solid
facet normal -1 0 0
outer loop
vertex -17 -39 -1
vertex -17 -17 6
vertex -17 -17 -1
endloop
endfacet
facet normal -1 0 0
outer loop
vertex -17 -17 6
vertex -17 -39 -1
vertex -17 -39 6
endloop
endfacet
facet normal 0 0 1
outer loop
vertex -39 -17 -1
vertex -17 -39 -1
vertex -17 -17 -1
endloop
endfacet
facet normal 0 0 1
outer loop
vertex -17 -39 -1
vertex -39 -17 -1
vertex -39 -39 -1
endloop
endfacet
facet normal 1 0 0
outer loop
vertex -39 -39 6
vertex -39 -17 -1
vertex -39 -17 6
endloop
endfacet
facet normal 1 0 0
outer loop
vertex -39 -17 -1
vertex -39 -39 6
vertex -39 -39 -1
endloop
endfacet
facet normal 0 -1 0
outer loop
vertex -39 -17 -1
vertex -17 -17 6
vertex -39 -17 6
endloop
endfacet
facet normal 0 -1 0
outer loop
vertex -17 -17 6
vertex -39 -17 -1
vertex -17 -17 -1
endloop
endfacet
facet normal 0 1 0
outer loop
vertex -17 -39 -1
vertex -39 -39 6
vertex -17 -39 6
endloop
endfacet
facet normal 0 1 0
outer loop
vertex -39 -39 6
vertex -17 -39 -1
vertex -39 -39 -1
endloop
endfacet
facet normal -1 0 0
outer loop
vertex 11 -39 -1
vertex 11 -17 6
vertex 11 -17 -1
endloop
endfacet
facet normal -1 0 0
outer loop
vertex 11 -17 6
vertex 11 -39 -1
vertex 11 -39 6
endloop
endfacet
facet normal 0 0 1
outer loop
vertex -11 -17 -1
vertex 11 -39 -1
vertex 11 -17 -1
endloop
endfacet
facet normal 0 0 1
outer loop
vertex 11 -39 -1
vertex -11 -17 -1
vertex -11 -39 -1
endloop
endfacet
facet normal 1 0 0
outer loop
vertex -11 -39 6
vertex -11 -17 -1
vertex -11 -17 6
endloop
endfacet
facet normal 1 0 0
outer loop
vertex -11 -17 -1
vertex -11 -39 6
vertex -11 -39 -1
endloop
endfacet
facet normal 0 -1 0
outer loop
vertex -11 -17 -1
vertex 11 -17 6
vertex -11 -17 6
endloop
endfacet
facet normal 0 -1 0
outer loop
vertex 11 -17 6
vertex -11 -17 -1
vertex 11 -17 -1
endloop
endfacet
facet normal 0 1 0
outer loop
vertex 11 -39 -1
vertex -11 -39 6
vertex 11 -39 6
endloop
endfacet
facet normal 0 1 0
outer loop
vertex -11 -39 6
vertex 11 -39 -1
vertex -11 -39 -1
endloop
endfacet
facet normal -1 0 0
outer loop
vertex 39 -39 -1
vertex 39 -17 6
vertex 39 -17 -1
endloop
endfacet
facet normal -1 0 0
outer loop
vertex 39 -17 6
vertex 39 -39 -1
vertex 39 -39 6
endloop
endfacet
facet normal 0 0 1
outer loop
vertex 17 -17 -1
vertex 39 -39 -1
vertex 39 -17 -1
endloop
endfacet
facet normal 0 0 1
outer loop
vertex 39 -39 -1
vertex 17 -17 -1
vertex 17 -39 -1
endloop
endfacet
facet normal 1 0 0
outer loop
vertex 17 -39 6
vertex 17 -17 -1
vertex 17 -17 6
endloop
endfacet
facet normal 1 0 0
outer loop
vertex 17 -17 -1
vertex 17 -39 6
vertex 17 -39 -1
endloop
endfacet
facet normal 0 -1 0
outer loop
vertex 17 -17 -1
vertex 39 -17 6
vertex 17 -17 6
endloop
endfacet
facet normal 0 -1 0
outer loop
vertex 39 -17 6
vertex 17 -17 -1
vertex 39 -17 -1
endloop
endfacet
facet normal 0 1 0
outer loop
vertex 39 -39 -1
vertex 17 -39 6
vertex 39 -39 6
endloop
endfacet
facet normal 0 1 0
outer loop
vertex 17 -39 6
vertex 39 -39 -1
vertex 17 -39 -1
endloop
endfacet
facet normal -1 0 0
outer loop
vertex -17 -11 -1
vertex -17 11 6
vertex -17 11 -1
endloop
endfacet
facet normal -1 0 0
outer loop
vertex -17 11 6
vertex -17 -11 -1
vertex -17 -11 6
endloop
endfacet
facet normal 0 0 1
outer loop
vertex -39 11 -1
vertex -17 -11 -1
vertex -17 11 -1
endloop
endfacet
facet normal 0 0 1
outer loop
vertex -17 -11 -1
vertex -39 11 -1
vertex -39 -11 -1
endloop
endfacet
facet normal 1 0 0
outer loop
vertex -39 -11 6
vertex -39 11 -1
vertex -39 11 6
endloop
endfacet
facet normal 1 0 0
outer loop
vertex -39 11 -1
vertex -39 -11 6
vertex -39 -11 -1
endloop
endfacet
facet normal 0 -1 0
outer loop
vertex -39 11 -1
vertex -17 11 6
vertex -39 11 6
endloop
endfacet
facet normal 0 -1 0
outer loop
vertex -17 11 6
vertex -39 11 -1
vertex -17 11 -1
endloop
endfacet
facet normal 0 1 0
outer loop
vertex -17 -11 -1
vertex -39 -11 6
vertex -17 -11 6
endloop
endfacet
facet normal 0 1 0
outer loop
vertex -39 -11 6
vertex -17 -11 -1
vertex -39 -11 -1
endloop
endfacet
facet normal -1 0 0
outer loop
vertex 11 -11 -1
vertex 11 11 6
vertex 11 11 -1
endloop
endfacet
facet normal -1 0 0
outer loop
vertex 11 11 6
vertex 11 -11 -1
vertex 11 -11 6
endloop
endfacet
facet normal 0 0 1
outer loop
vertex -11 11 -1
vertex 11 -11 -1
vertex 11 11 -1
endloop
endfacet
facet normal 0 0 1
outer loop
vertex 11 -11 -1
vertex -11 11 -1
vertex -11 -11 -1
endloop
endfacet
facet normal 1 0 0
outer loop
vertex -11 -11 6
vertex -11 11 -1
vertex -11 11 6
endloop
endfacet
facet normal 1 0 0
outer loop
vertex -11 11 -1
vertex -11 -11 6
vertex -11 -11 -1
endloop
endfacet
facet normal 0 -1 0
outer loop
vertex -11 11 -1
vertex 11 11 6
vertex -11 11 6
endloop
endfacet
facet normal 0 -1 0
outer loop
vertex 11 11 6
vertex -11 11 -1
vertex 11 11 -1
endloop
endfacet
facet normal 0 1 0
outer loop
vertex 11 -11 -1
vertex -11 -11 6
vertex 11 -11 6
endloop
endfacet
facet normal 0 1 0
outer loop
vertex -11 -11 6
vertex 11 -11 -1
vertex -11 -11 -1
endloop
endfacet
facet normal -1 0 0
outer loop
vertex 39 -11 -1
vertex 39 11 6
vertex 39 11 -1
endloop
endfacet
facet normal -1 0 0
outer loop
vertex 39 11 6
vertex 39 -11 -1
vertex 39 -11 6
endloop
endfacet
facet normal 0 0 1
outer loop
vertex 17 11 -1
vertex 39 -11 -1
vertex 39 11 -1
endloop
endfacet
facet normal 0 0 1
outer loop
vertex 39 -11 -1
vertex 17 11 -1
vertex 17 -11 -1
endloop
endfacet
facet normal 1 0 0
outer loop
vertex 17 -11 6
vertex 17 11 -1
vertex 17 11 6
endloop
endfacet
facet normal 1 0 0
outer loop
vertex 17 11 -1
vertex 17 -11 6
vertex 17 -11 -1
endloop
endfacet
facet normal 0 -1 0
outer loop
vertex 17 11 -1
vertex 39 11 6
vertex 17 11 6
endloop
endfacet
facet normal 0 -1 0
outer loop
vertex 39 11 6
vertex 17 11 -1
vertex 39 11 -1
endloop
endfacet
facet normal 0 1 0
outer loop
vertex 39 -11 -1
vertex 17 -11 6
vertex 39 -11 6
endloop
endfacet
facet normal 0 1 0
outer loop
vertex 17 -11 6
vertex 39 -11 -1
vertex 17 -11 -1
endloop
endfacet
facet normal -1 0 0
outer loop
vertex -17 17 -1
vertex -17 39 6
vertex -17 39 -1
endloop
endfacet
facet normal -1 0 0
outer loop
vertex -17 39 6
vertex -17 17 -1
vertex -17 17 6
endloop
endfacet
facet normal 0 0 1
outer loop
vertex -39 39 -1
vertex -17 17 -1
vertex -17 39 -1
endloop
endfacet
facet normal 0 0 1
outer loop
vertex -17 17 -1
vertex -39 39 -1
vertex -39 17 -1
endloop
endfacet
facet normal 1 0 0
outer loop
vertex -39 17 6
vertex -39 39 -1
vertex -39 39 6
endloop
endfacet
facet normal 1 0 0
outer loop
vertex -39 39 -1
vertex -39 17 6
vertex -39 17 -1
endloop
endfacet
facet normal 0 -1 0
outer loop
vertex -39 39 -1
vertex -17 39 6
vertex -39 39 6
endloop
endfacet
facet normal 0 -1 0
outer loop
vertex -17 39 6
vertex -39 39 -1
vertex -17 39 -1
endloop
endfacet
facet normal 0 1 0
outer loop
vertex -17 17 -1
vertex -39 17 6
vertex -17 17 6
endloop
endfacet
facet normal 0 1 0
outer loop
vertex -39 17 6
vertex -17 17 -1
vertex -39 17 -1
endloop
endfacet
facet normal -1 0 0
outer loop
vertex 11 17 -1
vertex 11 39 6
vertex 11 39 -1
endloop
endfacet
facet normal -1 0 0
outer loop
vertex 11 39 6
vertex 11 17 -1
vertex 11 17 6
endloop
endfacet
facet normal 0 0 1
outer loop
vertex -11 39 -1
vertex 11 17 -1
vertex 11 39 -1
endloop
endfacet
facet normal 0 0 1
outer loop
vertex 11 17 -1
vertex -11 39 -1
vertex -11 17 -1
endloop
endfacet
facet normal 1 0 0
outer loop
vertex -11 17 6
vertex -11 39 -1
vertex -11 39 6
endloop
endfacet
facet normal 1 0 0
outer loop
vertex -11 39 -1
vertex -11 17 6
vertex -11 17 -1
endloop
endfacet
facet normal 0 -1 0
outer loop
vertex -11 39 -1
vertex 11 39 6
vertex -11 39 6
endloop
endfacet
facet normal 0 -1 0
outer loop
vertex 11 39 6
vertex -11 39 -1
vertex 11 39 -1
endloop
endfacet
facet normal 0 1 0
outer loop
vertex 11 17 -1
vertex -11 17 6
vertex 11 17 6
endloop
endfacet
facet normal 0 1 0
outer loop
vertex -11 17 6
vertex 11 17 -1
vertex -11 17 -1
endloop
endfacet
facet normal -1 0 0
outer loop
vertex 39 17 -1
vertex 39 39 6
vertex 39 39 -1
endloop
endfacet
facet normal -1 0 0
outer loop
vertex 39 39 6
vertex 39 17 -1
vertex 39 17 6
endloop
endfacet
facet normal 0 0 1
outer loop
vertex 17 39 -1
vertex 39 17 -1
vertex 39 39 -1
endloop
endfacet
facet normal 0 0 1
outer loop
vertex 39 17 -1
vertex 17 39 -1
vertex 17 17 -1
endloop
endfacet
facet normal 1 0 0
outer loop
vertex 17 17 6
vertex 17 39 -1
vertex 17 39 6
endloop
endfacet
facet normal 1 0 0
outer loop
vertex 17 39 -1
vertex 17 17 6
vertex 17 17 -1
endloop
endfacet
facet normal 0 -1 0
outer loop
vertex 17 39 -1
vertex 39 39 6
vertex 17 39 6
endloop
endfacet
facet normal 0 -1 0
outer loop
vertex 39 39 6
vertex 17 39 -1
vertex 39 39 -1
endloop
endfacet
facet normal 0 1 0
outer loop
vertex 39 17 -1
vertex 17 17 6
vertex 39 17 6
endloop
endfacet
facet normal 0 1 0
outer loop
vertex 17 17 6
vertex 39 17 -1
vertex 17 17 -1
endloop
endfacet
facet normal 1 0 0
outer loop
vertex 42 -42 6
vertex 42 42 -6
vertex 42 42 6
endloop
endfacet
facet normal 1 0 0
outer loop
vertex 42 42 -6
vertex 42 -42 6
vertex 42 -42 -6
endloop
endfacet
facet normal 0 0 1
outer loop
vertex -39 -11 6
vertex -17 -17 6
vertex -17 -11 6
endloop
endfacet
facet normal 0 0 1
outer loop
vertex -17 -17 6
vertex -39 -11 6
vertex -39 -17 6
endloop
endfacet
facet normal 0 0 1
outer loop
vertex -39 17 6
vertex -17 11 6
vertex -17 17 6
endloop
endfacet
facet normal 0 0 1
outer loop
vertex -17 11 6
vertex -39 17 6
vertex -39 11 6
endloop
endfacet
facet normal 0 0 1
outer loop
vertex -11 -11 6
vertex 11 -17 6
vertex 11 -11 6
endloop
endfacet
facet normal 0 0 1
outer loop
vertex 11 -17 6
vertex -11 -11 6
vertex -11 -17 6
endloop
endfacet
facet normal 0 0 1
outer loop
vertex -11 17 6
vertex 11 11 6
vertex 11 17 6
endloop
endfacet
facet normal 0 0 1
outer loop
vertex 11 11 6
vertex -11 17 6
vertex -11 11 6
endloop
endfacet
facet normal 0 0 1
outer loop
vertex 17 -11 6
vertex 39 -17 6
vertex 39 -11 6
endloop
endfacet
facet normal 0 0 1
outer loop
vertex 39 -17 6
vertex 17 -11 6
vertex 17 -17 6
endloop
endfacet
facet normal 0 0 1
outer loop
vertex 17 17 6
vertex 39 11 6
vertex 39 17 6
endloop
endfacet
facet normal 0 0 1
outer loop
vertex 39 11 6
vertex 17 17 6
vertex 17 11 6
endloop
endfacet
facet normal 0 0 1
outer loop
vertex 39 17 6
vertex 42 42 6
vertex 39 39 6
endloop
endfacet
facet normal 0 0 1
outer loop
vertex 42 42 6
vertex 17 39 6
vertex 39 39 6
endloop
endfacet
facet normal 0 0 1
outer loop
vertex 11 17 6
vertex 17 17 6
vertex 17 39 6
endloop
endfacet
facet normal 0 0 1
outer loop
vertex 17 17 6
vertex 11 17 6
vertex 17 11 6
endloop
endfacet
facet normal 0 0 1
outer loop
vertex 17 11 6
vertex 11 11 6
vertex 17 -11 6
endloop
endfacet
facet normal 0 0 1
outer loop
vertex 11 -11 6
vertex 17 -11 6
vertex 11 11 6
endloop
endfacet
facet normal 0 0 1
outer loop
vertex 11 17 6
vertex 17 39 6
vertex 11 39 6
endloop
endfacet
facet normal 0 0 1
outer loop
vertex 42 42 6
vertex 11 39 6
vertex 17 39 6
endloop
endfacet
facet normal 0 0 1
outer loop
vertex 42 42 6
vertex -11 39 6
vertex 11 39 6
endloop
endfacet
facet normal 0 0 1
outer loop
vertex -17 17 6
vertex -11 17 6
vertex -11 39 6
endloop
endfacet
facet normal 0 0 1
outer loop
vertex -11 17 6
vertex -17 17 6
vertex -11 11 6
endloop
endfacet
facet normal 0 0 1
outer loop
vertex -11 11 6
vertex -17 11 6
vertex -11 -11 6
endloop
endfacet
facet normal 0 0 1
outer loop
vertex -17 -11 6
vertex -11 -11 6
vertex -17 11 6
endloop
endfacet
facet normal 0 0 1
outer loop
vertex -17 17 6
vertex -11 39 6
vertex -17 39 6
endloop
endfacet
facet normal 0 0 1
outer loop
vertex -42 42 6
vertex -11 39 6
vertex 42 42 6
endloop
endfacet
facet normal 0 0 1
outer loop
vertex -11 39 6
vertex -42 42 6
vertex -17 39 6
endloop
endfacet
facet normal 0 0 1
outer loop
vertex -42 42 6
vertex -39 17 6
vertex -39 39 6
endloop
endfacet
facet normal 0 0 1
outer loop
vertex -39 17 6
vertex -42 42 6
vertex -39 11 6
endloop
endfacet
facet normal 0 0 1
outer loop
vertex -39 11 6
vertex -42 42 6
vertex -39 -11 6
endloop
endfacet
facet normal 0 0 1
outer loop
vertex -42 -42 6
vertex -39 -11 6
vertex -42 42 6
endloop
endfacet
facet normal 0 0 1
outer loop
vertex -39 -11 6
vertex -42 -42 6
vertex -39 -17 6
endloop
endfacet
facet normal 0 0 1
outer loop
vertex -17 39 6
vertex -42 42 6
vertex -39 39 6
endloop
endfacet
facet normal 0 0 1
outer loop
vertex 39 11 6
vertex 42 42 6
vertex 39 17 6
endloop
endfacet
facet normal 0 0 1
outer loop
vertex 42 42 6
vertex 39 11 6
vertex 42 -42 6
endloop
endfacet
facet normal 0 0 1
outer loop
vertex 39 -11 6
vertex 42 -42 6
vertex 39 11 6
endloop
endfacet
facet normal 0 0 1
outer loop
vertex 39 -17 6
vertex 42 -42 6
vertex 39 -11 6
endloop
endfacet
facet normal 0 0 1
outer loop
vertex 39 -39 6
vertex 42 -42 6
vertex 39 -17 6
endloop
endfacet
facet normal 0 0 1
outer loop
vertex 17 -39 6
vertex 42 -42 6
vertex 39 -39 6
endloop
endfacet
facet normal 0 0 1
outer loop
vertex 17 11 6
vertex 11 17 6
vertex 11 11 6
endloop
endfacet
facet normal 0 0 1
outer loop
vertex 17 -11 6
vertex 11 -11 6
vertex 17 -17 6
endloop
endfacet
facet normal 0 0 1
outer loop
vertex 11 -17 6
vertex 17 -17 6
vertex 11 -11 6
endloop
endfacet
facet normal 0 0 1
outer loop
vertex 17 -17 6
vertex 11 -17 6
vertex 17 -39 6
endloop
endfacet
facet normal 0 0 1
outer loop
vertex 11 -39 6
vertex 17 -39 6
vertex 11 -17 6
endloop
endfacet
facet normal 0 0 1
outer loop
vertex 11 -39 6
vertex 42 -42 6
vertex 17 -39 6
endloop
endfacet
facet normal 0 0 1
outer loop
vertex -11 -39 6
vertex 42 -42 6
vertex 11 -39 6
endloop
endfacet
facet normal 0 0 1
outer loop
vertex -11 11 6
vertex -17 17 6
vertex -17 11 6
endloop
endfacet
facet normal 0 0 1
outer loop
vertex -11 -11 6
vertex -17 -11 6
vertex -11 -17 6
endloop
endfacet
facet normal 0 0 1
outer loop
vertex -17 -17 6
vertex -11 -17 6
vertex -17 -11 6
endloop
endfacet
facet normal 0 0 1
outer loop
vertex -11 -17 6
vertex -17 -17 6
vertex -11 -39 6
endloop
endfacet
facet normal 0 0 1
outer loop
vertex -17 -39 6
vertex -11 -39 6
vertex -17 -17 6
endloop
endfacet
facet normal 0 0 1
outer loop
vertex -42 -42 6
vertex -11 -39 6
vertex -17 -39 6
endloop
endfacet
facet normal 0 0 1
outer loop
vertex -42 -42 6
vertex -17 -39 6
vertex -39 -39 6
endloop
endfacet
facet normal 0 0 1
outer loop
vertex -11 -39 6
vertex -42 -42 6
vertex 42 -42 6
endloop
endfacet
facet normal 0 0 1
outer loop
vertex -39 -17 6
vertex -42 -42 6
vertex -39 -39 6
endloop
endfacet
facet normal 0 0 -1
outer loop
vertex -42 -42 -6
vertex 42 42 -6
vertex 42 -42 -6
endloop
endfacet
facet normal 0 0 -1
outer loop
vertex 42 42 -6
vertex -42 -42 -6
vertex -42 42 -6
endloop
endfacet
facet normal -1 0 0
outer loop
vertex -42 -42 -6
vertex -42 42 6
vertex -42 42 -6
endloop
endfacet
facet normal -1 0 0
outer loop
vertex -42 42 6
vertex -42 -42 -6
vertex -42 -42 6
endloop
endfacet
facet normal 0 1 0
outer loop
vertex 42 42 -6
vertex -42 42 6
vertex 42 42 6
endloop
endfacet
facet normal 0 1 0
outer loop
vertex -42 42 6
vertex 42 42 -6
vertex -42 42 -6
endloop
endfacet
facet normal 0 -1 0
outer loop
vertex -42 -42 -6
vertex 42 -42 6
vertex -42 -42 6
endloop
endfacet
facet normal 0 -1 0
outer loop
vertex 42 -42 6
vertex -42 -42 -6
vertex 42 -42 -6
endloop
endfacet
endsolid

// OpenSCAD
$fn = 32;

// ----------------------------------------------------------------------
// Pocket plate 84 x 84 x 12
// 3 x 3 pockets 22 mm square, 7 mm deep
// ----------------------------------------------------------------------

// --- parameters (mm) ---
thickness = 12;  // plate thickness
floor_t = 5;     // material left under each pocket
pocket = 22;     // pocket side length
pitch_x = 28;    // pocket pitch along X
pitch_y = 28;    // pocket pitch along Y
cols = 3;        // pockets per row
rows = 3;        // rows of pockets

// --- derived feature positions (mm) ---
depth = thickness - floor_t;        // = 7   pocket depth, down to the floor
span_x = (cols - 1) * pitch_x;      // = 56   distance between outer pockets
span_y = (rows - 1) * pitch_y;      // = 56   distance between outer pocket rows
origin_x = -span_x / 2;             // = -28   X of the first pocket
origin_y = -span_y / 2;             // = -28   Y of the first pocket
plate = [span_x + pocket + 6, span_y + pocket + 6, thickness];  // = [84, 84, 12]   overall size: pockets plus 3 mm of wall on each side
feature_centers = [
  [origin_x + 0 * pitch_x, origin_y + 0 * pitch_y],
  [origin_x + 1 * pitch_x, origin_y + 0 * pitch_y],
  [origin_x + 2 * pitch_x, origin_y + 0 * pitch_y],
  [origin_x + 0 * pitch_x, origin_y + 1 * pitch_y],
  [origin_x + 1 * pitch_x, origin_y + 1 * pitch_y],
  [origin_x + 2 * pitch_x, origin_y + 1 * pitch_y],
  [origin_x + 0 * pitch_x, origin_y + 2 * pitch_y],
  [origin_x + 1 * pitch_x, origin_y + 2 * pitch_y],
  [origin_x + 2 * pitch_x, origin_y + 2 * pitch_y]
];   // pocket centres, used verbatim by the cutter loop

// plate outline, then one pocket per centre in feature_centers
difference() {
  cube(plate, center = true);
  for (centre = feature_centers)
    translate([centre[0] - pocket / 2, centre[1] - pocket / 2, plate[2] / 2 - depth])
      cube([pocket, pocket, depth + 1]);  // centred on the declared pocket centre
}
